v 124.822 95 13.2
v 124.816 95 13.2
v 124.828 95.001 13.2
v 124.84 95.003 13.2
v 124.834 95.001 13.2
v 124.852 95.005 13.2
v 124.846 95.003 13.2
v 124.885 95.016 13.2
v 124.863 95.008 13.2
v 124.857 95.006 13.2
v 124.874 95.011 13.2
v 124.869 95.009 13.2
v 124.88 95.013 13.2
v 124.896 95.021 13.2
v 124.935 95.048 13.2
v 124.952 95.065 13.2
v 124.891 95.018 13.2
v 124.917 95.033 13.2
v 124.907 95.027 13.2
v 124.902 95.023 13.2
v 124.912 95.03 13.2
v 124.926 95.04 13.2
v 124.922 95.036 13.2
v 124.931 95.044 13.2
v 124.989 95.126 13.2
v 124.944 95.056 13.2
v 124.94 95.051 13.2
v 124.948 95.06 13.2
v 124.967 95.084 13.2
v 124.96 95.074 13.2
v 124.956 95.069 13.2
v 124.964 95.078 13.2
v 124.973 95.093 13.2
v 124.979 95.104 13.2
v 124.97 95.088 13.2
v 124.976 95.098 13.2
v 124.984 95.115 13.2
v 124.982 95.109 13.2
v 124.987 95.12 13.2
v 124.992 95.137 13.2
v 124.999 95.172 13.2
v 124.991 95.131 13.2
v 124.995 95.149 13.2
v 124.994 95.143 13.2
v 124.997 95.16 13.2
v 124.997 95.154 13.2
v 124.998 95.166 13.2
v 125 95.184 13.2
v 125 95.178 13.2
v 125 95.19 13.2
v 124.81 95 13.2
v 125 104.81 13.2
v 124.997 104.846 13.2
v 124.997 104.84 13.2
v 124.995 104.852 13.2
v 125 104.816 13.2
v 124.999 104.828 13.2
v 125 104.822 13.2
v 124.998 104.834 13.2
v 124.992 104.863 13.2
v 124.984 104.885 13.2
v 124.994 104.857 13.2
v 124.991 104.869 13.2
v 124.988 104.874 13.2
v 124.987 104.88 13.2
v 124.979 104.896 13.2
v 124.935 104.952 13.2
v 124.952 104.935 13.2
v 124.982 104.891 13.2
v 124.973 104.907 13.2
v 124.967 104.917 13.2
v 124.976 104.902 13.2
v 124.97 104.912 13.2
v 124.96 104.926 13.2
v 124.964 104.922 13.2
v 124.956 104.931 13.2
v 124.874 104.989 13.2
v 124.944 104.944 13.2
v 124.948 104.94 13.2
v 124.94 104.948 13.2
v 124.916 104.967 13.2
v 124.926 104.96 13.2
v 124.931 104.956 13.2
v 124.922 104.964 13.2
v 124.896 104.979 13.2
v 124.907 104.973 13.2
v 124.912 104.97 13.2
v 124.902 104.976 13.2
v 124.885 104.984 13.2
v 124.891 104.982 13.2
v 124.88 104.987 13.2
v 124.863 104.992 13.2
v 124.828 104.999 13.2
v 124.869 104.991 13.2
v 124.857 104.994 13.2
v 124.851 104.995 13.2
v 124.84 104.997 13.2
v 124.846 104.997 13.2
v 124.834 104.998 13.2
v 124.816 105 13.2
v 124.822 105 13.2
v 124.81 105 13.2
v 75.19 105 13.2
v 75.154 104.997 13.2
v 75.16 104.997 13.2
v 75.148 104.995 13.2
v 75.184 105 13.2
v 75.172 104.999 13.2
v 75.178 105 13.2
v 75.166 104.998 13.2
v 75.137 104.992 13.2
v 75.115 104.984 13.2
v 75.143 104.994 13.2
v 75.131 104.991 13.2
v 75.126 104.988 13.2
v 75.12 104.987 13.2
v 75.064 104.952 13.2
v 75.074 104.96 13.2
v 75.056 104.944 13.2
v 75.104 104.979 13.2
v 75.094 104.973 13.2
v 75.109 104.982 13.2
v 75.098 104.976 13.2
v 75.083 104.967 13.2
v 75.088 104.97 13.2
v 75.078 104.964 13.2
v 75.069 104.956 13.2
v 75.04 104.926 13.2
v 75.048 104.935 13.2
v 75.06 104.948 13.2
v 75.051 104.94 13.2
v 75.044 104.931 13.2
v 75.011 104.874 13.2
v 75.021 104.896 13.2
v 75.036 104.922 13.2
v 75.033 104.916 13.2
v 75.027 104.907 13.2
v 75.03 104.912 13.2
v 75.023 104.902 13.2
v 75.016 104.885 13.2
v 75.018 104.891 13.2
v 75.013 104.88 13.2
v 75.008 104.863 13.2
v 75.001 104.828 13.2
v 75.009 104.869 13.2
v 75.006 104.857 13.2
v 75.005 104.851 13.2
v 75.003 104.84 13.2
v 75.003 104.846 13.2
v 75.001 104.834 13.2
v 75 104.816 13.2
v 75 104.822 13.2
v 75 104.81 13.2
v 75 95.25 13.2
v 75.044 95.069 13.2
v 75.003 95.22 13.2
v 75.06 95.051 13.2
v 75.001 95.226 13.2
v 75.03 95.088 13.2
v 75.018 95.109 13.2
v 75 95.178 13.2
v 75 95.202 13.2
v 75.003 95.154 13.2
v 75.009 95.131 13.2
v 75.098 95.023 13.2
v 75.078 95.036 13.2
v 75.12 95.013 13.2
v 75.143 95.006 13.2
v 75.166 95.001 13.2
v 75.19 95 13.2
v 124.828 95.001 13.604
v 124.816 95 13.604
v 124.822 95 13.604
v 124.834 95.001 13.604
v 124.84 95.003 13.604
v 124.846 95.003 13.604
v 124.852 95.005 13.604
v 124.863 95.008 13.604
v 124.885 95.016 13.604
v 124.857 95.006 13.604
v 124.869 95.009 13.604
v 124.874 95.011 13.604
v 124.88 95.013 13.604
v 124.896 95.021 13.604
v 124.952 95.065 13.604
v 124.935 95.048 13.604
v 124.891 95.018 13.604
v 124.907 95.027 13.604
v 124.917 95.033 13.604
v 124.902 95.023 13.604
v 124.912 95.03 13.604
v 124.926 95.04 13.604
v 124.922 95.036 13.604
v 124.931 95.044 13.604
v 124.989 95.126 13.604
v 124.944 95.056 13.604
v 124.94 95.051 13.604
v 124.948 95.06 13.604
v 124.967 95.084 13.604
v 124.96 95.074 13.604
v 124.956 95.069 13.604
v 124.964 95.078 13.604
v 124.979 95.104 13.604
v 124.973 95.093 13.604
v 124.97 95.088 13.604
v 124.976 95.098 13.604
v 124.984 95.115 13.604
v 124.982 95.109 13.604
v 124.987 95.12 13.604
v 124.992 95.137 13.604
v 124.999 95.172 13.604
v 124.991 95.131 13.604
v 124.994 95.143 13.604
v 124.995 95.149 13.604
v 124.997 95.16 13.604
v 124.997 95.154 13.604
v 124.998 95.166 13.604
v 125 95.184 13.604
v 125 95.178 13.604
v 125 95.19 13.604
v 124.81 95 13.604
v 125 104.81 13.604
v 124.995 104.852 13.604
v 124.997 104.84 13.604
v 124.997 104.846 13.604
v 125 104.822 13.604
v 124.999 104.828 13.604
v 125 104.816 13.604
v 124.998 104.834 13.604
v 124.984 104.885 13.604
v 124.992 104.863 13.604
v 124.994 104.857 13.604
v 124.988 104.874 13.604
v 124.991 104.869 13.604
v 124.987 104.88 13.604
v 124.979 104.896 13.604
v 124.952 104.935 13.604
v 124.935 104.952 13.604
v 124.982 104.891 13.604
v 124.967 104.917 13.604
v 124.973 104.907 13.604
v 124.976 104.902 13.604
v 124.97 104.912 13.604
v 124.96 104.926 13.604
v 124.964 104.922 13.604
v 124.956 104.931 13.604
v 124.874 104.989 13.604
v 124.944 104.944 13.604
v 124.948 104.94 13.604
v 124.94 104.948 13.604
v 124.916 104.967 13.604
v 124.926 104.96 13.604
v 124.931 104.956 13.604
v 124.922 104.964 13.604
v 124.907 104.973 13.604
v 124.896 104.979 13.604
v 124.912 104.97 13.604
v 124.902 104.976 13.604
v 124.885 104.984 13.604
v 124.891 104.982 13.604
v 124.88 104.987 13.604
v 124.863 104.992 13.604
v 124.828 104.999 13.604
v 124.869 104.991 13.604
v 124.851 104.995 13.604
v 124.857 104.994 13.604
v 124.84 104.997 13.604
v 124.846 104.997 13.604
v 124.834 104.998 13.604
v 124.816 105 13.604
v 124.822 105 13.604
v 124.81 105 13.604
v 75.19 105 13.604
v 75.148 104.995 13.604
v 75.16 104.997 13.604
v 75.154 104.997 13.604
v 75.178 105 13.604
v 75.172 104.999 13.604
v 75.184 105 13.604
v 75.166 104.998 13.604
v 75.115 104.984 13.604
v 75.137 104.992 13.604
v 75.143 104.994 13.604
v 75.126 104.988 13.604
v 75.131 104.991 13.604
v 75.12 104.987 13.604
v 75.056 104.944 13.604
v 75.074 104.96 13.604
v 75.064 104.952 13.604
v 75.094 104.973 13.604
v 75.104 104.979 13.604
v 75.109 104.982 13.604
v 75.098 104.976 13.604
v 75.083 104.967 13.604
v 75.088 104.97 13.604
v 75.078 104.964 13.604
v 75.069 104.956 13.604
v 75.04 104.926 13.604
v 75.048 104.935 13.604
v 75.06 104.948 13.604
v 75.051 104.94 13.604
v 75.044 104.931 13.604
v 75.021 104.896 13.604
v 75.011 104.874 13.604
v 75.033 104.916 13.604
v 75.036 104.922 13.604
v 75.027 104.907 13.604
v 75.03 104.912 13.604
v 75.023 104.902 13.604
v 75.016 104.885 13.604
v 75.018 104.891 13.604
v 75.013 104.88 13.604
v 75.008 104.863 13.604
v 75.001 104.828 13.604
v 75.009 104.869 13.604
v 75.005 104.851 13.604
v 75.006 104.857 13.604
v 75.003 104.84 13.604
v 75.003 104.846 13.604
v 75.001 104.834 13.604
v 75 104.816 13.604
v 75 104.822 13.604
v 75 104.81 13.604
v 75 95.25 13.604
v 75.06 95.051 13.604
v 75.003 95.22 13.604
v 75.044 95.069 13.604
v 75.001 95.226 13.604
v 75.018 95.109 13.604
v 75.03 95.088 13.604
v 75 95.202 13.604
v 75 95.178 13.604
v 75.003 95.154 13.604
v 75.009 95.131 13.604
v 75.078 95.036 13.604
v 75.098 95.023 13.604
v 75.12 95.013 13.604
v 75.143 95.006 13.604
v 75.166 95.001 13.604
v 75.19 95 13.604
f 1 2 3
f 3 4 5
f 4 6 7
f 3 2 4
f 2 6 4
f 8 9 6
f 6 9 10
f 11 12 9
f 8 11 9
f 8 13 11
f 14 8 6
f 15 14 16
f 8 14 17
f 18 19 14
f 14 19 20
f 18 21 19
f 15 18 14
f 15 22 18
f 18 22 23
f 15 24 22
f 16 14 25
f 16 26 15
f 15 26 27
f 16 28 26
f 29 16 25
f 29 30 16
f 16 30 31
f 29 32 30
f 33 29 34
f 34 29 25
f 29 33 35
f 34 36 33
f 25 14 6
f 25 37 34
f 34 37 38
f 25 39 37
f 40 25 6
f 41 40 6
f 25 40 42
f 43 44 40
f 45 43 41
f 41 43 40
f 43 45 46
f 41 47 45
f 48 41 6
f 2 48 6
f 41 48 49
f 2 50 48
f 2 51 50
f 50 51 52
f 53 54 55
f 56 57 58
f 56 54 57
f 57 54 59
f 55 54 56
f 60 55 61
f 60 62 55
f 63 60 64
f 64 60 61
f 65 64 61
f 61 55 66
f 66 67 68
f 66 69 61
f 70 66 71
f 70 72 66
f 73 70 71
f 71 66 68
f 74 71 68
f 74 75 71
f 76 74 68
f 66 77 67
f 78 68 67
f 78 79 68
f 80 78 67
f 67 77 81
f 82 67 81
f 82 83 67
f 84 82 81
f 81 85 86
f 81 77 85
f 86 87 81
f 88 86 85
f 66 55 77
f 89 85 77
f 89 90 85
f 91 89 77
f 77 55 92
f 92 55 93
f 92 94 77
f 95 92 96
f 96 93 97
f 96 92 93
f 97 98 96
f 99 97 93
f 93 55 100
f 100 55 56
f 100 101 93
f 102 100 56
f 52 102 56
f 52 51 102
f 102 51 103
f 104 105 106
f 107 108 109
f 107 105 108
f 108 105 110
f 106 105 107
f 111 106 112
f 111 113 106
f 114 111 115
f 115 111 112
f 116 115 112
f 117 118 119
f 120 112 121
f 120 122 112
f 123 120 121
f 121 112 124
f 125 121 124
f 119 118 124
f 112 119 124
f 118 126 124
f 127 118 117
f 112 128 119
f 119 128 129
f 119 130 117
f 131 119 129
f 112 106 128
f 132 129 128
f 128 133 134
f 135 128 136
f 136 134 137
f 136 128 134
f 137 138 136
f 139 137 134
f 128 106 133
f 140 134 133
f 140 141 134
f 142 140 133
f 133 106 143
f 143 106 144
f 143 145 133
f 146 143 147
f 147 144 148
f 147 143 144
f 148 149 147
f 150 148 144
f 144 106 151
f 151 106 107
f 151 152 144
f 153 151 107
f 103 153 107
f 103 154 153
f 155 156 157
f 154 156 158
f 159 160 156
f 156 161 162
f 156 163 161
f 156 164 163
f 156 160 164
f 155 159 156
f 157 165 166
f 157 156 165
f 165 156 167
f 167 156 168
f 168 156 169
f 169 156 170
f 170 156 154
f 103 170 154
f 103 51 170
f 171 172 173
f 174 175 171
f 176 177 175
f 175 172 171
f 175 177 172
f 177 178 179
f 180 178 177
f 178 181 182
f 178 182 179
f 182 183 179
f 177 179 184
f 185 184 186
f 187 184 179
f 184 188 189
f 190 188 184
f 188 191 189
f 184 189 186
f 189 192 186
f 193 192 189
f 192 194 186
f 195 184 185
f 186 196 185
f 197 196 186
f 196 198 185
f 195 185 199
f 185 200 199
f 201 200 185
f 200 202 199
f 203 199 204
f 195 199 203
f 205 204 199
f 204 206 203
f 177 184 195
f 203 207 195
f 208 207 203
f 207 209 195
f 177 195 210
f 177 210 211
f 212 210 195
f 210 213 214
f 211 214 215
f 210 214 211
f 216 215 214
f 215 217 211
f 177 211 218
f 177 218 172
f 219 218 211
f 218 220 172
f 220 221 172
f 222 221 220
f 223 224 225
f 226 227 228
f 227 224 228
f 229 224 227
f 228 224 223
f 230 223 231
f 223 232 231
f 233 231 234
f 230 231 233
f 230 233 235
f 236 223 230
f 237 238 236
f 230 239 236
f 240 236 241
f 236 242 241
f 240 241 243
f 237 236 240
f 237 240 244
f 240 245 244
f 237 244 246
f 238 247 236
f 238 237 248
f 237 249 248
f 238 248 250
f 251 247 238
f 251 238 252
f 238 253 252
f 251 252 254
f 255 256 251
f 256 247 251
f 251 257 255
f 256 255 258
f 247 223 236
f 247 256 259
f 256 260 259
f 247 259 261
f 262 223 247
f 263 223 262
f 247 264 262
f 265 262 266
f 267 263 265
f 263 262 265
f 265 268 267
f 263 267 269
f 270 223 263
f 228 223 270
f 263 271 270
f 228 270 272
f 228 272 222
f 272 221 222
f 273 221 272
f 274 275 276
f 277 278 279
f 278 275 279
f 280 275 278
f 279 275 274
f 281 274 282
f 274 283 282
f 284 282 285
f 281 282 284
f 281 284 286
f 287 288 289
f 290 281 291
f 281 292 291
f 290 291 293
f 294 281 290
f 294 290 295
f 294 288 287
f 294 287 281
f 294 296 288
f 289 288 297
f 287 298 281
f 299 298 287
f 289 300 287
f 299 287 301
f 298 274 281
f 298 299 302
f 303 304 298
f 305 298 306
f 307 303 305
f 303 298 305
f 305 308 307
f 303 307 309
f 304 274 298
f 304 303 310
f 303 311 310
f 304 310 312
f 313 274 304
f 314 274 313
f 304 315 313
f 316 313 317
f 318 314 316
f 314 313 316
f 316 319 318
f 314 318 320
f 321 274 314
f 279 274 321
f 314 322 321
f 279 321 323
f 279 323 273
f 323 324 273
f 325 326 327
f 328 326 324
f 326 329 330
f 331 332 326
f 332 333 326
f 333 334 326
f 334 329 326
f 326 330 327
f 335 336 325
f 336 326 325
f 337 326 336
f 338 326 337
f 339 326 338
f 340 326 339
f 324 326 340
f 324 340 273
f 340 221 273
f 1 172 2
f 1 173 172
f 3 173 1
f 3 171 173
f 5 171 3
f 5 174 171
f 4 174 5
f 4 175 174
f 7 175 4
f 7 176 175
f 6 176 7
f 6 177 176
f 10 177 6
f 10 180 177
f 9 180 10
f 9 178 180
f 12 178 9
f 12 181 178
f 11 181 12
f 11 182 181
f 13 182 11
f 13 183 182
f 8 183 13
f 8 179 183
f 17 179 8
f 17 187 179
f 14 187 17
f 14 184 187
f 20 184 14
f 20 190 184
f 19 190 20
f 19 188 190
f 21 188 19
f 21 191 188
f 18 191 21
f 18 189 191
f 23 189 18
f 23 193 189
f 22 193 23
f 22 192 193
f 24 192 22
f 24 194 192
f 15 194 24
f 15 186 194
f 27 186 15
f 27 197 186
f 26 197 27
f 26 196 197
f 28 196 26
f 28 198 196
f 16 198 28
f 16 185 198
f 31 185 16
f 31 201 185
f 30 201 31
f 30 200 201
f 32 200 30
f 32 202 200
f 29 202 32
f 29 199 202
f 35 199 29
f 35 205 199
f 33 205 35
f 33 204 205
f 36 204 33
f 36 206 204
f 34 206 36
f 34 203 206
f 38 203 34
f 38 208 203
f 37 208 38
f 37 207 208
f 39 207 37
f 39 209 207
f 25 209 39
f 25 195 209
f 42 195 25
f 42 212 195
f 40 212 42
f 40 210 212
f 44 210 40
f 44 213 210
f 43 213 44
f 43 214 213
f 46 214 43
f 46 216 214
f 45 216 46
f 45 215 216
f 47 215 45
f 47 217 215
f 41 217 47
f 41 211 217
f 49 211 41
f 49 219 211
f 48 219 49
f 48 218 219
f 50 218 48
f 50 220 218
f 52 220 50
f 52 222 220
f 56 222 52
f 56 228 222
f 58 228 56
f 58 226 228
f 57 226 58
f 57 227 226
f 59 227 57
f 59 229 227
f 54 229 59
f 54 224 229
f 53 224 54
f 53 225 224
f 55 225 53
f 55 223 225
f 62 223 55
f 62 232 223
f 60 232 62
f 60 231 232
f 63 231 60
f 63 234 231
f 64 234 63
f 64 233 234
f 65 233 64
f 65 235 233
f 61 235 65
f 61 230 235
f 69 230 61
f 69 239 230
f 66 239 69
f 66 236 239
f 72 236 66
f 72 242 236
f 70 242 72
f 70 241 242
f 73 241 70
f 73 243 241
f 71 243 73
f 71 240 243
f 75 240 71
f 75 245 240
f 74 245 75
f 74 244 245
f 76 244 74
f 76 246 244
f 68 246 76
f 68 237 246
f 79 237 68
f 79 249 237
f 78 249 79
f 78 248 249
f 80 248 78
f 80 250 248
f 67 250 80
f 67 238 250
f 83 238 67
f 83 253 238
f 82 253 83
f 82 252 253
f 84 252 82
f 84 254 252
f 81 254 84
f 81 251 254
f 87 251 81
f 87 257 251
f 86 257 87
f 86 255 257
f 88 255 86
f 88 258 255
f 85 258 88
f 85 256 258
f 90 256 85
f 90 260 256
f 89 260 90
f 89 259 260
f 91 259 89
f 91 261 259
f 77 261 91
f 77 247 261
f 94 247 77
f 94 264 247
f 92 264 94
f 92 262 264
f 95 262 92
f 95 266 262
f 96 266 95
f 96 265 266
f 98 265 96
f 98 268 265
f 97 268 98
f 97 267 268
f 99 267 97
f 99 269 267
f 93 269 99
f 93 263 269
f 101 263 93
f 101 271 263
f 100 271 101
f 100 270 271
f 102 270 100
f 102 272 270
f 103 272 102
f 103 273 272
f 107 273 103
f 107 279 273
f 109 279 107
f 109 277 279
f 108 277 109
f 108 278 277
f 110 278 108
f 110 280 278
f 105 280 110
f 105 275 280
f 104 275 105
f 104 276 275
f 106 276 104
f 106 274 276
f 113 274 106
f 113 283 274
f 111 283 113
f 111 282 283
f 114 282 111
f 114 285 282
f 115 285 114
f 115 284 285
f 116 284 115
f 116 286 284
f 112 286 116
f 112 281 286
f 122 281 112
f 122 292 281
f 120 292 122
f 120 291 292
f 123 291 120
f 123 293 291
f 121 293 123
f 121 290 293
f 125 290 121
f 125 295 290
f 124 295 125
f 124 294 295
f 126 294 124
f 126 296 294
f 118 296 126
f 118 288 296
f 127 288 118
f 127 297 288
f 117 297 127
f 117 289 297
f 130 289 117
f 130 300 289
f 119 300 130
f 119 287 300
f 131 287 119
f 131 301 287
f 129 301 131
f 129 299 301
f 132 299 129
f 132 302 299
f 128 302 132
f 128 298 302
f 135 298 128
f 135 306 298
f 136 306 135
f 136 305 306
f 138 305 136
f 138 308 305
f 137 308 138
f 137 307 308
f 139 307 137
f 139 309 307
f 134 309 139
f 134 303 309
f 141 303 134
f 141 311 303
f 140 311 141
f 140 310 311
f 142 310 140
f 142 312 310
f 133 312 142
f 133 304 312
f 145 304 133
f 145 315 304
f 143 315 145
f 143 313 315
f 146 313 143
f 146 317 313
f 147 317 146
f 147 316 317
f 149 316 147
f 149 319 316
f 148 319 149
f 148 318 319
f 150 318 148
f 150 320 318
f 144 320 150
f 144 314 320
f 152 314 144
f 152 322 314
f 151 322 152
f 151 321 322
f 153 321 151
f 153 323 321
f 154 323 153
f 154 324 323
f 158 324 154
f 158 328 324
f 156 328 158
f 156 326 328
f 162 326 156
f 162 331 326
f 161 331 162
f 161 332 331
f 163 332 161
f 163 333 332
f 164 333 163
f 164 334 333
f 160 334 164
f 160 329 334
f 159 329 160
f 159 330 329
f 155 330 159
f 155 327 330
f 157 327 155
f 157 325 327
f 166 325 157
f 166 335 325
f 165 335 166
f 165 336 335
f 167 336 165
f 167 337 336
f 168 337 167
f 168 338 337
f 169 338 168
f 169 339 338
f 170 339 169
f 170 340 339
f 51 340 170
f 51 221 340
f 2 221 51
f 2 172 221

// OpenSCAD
module drawBasicShape(x1, y1, x2, y2, width)
{
	length = sqrt((x1-x2)*(x1-x2) + (y1-y2)*(y1-y2));
	if (width!=0.0) {
		square(size = [width, length], center = false);
		translate([width/2.0, 0, 0]) circle(d=width);
		translate([width/2.0, length, 0]) circle(d=width);
	}
}

module translateAndRotate(x1, y1, x2, y2, width)
{
	if (width != 0.0) {
		angle = atan((y2-y1)/(x2-x1)) +270;
		if (x2>=x1) {
			translate([x1, y1, 0.0]) rotate([0.0, 0.0, angle]) translate([-width/2.0, 0.0, 0.0]) scale([1.0, 1.0, 1.0]) drawBasicShape(x1, y1, x2, y2, width);
		}
		else {
			translate([x1, y1, 0.0]) rotate([0.0, 0.0, angle+180]) translate([-width/2.0, 0.0, 0.0]) scale([1.0, 1.0, 1.0]) drawBasicShape(x1, y1, x2, y2, width);		}
	}
}

$fn=50;

points32 = [
[75.77800000, 95.77800000, 0.00000000],
[124.22200000, 95.77800000, 0.37999672],
[124.22200000, 104.22200000, 0.37997788],
[75.77800000, 104.22200000, 0.37999548],
[75.77800000, 95.83800000, 0.37998140],
[75.48400000, 95.48400000, 0.00000000],
[124.51600000, 95.48400000, 0.37999746],
[124.51600000, 104.51600000, 0.37998977],
[75.48400000, 104.51600000, 0.37999868],
[75.48400000, 95.54400000, 0.37998644],
[75.19000000, 95.19000000, 0.00000000],
[124.81000000, 95.19000000, 0.38000060],
[124.81000000, 104.81000000, 0.38000021],
[75.19000000, 104.81000000, 0.37999939],
[75.19000000, 95.25000000, 0.38000344],
[75.53600000, 95.39000000, 0.00000000],
[75.94600000, 103.88900000, 0.00000000],
[76.11100000, 104.05400000, 0.37935605],
[76.52800000, 104.05400000, 0.38015610],
[75.94600000, 103.47200000, 0.37989934],
[75.94600000, 103.05500000, 0.38001190],
[76.94500000, 104.05400000, 0.37994651],
[77.36200000, 104.05400000, 0.38015610],
[75.94600000, 102.63800000, 0.37996589],
[75.94600000, 102.22100000, 0.38015610],
[77.77900000, 104.05400000, 0.37999966],
[78.19600000, 104.05400000, 0.38001190],
[75.94600000, 101.80400000, 0.38000201],
[75.94600000, 101.38700000, 0.38015610],
[78.61300000, 104.05400000, 0.38000362],
[79.03000000, 104.05400000, 0.38015610],
[75.94600000, 100.97000000, 0.38001859],
[75.94600000, 100.55300000, 0.38001190],
[79.44700000, 104.05400000, 0.38001785],
[79.86400000, 104.05400000, 0.38001190],
[75.94600000, 100.13600000, 0.38002811],
[75.94600000, 99.71900000, 0.38001190],
[80.28100000, 104.05400000, 0.38002660],
[80.69800000, 104.05400000, 0.38015610],
[75.94600000, 99.30200000, 0.38002534],
[75.94600000, 98.88500000, 0.38001190],
[81.11500000, 104.05400000, 0.38003252],
[81.53300000, 104.05400000, 0.37930814],
[75.94600000, 98.46700000, 0.37997836],
[75.94600000, 98.05000000, 0.38001190],
[81.95000000, 104.05400000, 0.37998780],
[82.36700000, 104.05400000, 0.38001190],
[75.94600000, 97.63300000, 0.37998939],
[75.94600000, 97.21600000, 0.38001190],
[82.78400000, 104.05400000, 0.37999079],
[83.20100000, 104.05400000, 0.38001190],
[75.94600000, 96.79900000, 0.37999789],
[75.94600000, 96.38200000, 0.38001190],
[83.61800000, 104.05400000, 0.37999314],
[84.03500000, 104.05400000, 0.38015610],
[75.95600000, 95.97600000, 0.38000275],
[76.34400000, 95.94600000, 0.37958004],
[84.45200000, 104.05400000, 0.38000229],
[84.86900000, 104.05400000, 0.38001190],
[76.76100000, 95.94600000, 0.38000754],
[77.17800000, 95.94600000, 0.38001190],
[85.28600000, 104.05400000, 0.38000229],
[85.70300000, 104.05400000, 0.38001190],
[77.59500000, 95.94600000, 0.38000754],
[78.01200000, 95.94600000, 0.38001190],
[86.12000000, 104.05400000, 0.38000229],
[86.53700000, 104.05400000, 0.38015610],
[78.42900000, 95.94600000, 0.38000229],
[78.84600000, 95.94600000, 0.38001190],
[86.95400000, 104.05400000, 0.38000754],
[87.37100000, 104.05400000, 0.38001190],
[79.26300000, 95.94600000, 0.38000229],
[79.68000000, 95.94600000, 0.38001190],
[87.78900000, 104.05400000, 0.37998940],
[88.20600000, 104.05400000, 0.38001190],
[80.09700000, 95.94600000, 0.37998415],
[80.51500000, 95.94600000, 0.37945200],
[88.62300000, 104.05400000, 0.38000229],
[89.04000000, 104.05400000, 0.38001190],
[80.93200000, 95.94600000, 0.38000754],
[81.34900000, 95.94600000, 0.38001190],
[89.45700000, 104.05400000, 0.38000229],
[89.87400000, 104.05400000, 0.38001190],
[81.76600000, 95.94600000, 0.38000754],
[82.18300000, 95.94600000, 0.38001190],
[90.29100000, 104.05400000, 0.38000229],
[90.70800000, 104.05400000, 0.38015610],
[82.60000000, 95.94600000, 0.38000229],
[83.01700000, 95.94600000, 0.38001190],
[91.12500000, 104.05400000, 0.38000754],
[91.54200000, 104.05400000, 0.38001190],
[83.43400000, 95.94600000, 0.38000229],
[83.85100000, 95.94600000, 0.38001190],
[91.95900000, 104.05400000, 0.38000754],
[92.37600000, 104.05400000, 0.38001190],
[84.26800000, 95.94600000, 0.38000229],
[84.68500000, 95.94600000, 0.38015610],
[92.79300000, 104.05400000, 0.38000229],
[93.21000000, 104.05400000, 0.38001190],
[85.10200000, 95.94600000, 0.38000229],
[85.51900000, 95.94600000, 0.38015610],
[93.62700000, 104.05400000, 0.38000229],
[94.04400000, 104.05400000, 0.38001190],
[85.93600000, 95.94600000, 0.38000754],
[86.35300000, 95.94600000, 0.38001190],
[94.46200000, 104.05400000, 0.37998415],
[94.87900000, 104.05400000, 0.38015610],
[86.77000000, 95.94600000, 0.37998415],
[87.18800000, 95.94600000, 0.37930814],
[95.29600000, 104.05400000, 0.38000229],
[95.71300000, 104.05400000, 0.38015610],
[87.60500000, 95.94600000, 0.38000229],
[88.02200000, 95.94600000, 0.38001190],
[96.13000000, 104.05400000, 0.38000754],
[96.54700000, 104.05400000, 0.38001190],
[88.43900000, 95.94600000, 0.38000229],
[88.85600000, 95.94600000, 0.38001190],
[96.96400000, 104.05400000, 0.38000754],
[97.38100000, 104.05400000, 0.38001190],
[89.27300000, 95.94600000, 0.38000229],
[89.69000000, 95.94600000, 0.38015610],
[97.79800000, 104.05400000, 0.38000229],
[98.21500000, 104.05400000, 0.38001190],
[90.10700000, 95.94600000, 0.38000754],
[90.52400000, 95.94600000, 0.38001190],
[98.63200000, 104.05400000, 0.38000229],
[99.04900000, 104.05400000, 0.38001190],
[90.94100000, 95.94600000, 0.38000754],
[91.35800000, 95.94600000, 0.38001190],
[99.46600000, 104.05400000, 0.38000229],
[99.88300000, 104.05400000, 0.38015610],
[91.77500000, 95.94600000, 0.38000229],
[92.19200000, 95.94600000, 0.38001190],
[100.30000000, 104.05400000, 0.38000754],
[100.71800000, 104.05400000, 0.37930814],
[92.60900000, 95.94600000, 0.37998415],
[93.02600000, 95.94600000, 0.38001190],
[101.13500000, 104.05400000, 0.37998940],
[101.55200000, 104.05400000, 0.38001190],
[93.44400000, 95.94600000, 0.38000229],
[93.86100000, 95.94600000, 0.38015610],
[101.96900000, 104.05400000, 0.38000229],
[102.38600000, 104.05400000, 0.38001190],
[94.27800000, 95.94600000, 0.38000754],
[94.69500000, 95.94600000, 0.38001190],
[102.80300000, 104.05400000, 0.38000229],
[103.22000000, 104.05400000, 0.38001190],
[95.11200000, 95.94600000, 0.38000754],
[95.52900000, 95.94600000, 0.38001190],
[103.63700000, 104.05400000, 0.38000229],
[104.05400000, 104.05400000, 0.38015610],
[95.94600000, 95.94600000, 0.38000229],
[96.36300000, 95.94600000, 0.38001190],
[104.47100000, 104.05400000, 0.38000754],
[104.88800000, 104.05400000, 0.38001190],
[96.78000000, 95.94600000, 0.38000229],
[97.19700000, 95.94600000, 0.38001190],
[105.30500000, 104.05400000, 0.38000754],
[105.72200000, 104.05400000, 0.38001190],
[97.61400000, 95.94600000, 0.38000229],
[98.03100000, 95.94600000, 0.38015610],
[106.13900000, 104.05400000, 0.38000229],
[106.55600000, 104.05400000, 0.38001190],
[98.44800000, 95.94600000, 0.38000754],
[98.86500000, 95.94600000, 0.38001190],
[106.97300000, 104.05400000, 0.38000229],
[107.39100000, 104.05400000, 0.37930814],
[99.28200000, 95.94600000, 0.37998940],
[99.69900000, 95.94600000, 0.38001190],
[107.80800000, 104.05400000, 0.37998415],
[108.22500000, 104.05400000, 0.38015610],
[100.11700000, 95.94600000, 0.38000229],
[100.53400000, 95.94600000, 0.38001190],
[108.64200000, 104.05400000, 0.38000229],
[109.05900000, 104.05400000, 0.38015610],
[100.95100000, 95.94600000, 0.38000229],
[101.36800000, 95.94600000, 0.38001190],
[109.47600000, 104.05400000, 0.38000754],
[109.89300000, 104.05400000, 0.38001190],
[101.78500000, 95.94600000, 0.38000229],
[102.20200000, 95.94600000, 0.38015610],
[110.31000000, 104.05400000, 0.38000229],
[110.72700000, 104.05400000, 0.38001190],
[102.61900000, 95.94600000, 0.38000229],
[103.03600000, 95.94600000, 0.38015610],
[111.14400000, 104.05400000, 0.38000229],
[111.56100000, 104.05400000, 0.38001190],
[103.45300000, 95.94600000, 0.38000754],
[103.87000000, 95.94600000, 0.38001190],
[111.97800000, 104.05400000, 0.38000229],
[112.39500000, 104.05400000, 0.38001190],
[104.28700000, 95.94600000, 0.38000754],
[104.70400000, 95.94600000, 0.38001190],
[112.81200000, 104.05400000, 0.38000229],
[113.22900000, 104.05400000, 0.38015610],
[105.12100000, 95.94600000, 0.38000229],
[105.53800000, 95.94600000, 0.38001190],
[113.64700000, 104.05400000, 0.37998940],
[114.06400000, 104.05400000, 0.38001190],
[105.95500000, 95.94600000, 0.37998415],
[106.37300000, 95.94600000, 0.37930814],
[114.48100000, 104.05400000, 0.38000754],
[114.89800000, 104.05400000, 0.38001190],
[106.79000000, 95.94600000, 0.38000229],
[107.20700000, 95.94600000, 0.38015610],
[115.31500000, 104.05400000, 0.38000229],
[115.73200000, 104.05400000, 0.38001190],
[107.62400000, 95.94600000, 0.38000754],
[108.04100000, 95.94600000, 0.38001190],
[116.14900000, 104.05400000, 0.38000229],
[116.56600000, 104.05400000, 0.38001190],
[108.45800000, 95.94600000, 0.38000754],
[108.87500000, 95.94600000, 0.38001190],
[116.98300000, 104.05400000, 0.38000229],
[117.40000000, 104.05400000, 0.38015610],
[109.29200000, 95.94600000, 0.38000229],
[109.70900000, 95.94600000, 0.38001190],
[117.81700000, 104.05400000, 0.38000754],
[118.23400000, 104.05400000, 0.38001190],
[110.12600000, 95.94600000, 0.38000229],
[110.54300000, 95.94600000, 0.38001190],
[118.65100000, 104.05400000, 0.38000754],
[119.06800000, 104.05400000, 0.38001190],
[110.96000000, 95.94600000, 0.38000229],
[111.37700000, 95.94600000, 0.38015610],
[119.48500000, 104.05400000, 0.38000229],
[119.90200000, 104.05400000, 0.38001190],
[111.79400000, 95.94600000, 0.38000229],
[112.21100000, 95.94600000, 0.38015610],
[120.32000000, 104.05400000, 0.37998415],
[120.73700000, 104.05400000, 0.38001190],
[112.62900000, 95.94600000, 0.38000754],
[113.04600000, 95.94600000, 0.38001190],
[121.15400000, 104.05400000, 0.38000229],
[121.57100000, 104.05400000, 0.38001190],
[113.46300000, 95.94600000, 0.38000754],
[113.88000000, 95.94600000, 0.38001190],
[121.98800000, 104.05400000, 0.38000229],
[122.40500000, 104.05400000, 0.38015610],
[114.29700000, 95.94600000, 0.38000229],
[114.71400000, 95.94600000, 0.38001190],
[122.82200000, 104.05400000, 0.38000754],
[123.23900000, 104.05400000, 0.38001190],
[115.13100000, 95.94600000, 0.38000229],
[115.54800000, 95.94600000, 0.38001190],
[123.65600000, 104.05400000, 0.38000754],
[124.04400000, 104.02500000, 0.37963728],
[115.96500000, 95.94600000, 0.37998455],
[116.38200000, 95.94600000, 0.38001190],
[124.05400000, 103.61800000, 0.37999868],
[124.05400000, 103.20100000, 0.38001190],
[116.79900000, 95.94600000, 0.37999789],
[117.21600000, 95.94600000, 0.38001190],
[124.05400000, 102.78400000, 0.37999701],
[124.05400000, 102.36700000, 0.38001190],
[117.63300000, 95.94600000, 0.37998939],
[118.05000000, 95.94600000, 0.38001190],
[124.05400000, 101.95000000, 0.37998780],
[124.05400000, 101.53300000, 0.38001190],
[118.46700000, 95.94600000, 0.37998597],
[118.88400000, 95.94600000, 0.38001190],
[124.05400000, 101.11600000, 0.37997562],
[124.05400000, 100.69800000, 0.37930814],
[119.30200000, 95.94600000, 0.38003429],
[119.71900000, 95.94600000, 0.38001190],
[124.05400000, 100.28100000, 0.38002660],
[124.05400000, 99.86400000, 0.38015610],
[120.13600000, 95.94600000, 0.38002811],
[120.55300000, 95.94600000, 0.38001190],
[124.05400000, 99.44700000, 0.38002999],
[124.05400000, 99.03000000, 0.38001190],
[120.97000000, 95.94600000, 0.38001859],
[121.38700000, 95.94600000, 0.38015610],
[124.05400000, 98.61300000, 0.38001957],
[124.05400000, 98.19600000, 0.38001190],
[121.80400000, 95.94600000, 0.38002091],
[122.22100000, 95.94600000, 0.38001190],
[124.05400000, 97.77900000, 0.37999966],
[124.05400000, 97.36200000, 0.38015610],
[122.63800000, 95.94600000, 0.37999592],
[123.05500000, 95.94600000, 0.38001190],
[124.05400000, 96.94500000, 0.37998907],
[124.05400000, 96.52800000, 0.38001190],
[123.47200000, 95.94600000, 0.37989934],
[123.88900000, 95.94600000, 0.38015610],
[124.05400000, 96.11100000, 0.37961375],
];

translate([0.0, 0.0, 13.20000000]) {
	linear_extrude(height = 0.40400000, center = false, convexity = 10, twist = 0) {
		union() {
			for( i=[0:len(points32)-2] ){ 
				x1 = points32[i][0];
				y1 = points32[i][1];
				x2 = points32[i+1][0];
				y2 = points32[i+1][1];
				width = points32[i+1][2];
				translateAndRotate(x1, y1, x2, y2, width);
			}
		}
	}
}
